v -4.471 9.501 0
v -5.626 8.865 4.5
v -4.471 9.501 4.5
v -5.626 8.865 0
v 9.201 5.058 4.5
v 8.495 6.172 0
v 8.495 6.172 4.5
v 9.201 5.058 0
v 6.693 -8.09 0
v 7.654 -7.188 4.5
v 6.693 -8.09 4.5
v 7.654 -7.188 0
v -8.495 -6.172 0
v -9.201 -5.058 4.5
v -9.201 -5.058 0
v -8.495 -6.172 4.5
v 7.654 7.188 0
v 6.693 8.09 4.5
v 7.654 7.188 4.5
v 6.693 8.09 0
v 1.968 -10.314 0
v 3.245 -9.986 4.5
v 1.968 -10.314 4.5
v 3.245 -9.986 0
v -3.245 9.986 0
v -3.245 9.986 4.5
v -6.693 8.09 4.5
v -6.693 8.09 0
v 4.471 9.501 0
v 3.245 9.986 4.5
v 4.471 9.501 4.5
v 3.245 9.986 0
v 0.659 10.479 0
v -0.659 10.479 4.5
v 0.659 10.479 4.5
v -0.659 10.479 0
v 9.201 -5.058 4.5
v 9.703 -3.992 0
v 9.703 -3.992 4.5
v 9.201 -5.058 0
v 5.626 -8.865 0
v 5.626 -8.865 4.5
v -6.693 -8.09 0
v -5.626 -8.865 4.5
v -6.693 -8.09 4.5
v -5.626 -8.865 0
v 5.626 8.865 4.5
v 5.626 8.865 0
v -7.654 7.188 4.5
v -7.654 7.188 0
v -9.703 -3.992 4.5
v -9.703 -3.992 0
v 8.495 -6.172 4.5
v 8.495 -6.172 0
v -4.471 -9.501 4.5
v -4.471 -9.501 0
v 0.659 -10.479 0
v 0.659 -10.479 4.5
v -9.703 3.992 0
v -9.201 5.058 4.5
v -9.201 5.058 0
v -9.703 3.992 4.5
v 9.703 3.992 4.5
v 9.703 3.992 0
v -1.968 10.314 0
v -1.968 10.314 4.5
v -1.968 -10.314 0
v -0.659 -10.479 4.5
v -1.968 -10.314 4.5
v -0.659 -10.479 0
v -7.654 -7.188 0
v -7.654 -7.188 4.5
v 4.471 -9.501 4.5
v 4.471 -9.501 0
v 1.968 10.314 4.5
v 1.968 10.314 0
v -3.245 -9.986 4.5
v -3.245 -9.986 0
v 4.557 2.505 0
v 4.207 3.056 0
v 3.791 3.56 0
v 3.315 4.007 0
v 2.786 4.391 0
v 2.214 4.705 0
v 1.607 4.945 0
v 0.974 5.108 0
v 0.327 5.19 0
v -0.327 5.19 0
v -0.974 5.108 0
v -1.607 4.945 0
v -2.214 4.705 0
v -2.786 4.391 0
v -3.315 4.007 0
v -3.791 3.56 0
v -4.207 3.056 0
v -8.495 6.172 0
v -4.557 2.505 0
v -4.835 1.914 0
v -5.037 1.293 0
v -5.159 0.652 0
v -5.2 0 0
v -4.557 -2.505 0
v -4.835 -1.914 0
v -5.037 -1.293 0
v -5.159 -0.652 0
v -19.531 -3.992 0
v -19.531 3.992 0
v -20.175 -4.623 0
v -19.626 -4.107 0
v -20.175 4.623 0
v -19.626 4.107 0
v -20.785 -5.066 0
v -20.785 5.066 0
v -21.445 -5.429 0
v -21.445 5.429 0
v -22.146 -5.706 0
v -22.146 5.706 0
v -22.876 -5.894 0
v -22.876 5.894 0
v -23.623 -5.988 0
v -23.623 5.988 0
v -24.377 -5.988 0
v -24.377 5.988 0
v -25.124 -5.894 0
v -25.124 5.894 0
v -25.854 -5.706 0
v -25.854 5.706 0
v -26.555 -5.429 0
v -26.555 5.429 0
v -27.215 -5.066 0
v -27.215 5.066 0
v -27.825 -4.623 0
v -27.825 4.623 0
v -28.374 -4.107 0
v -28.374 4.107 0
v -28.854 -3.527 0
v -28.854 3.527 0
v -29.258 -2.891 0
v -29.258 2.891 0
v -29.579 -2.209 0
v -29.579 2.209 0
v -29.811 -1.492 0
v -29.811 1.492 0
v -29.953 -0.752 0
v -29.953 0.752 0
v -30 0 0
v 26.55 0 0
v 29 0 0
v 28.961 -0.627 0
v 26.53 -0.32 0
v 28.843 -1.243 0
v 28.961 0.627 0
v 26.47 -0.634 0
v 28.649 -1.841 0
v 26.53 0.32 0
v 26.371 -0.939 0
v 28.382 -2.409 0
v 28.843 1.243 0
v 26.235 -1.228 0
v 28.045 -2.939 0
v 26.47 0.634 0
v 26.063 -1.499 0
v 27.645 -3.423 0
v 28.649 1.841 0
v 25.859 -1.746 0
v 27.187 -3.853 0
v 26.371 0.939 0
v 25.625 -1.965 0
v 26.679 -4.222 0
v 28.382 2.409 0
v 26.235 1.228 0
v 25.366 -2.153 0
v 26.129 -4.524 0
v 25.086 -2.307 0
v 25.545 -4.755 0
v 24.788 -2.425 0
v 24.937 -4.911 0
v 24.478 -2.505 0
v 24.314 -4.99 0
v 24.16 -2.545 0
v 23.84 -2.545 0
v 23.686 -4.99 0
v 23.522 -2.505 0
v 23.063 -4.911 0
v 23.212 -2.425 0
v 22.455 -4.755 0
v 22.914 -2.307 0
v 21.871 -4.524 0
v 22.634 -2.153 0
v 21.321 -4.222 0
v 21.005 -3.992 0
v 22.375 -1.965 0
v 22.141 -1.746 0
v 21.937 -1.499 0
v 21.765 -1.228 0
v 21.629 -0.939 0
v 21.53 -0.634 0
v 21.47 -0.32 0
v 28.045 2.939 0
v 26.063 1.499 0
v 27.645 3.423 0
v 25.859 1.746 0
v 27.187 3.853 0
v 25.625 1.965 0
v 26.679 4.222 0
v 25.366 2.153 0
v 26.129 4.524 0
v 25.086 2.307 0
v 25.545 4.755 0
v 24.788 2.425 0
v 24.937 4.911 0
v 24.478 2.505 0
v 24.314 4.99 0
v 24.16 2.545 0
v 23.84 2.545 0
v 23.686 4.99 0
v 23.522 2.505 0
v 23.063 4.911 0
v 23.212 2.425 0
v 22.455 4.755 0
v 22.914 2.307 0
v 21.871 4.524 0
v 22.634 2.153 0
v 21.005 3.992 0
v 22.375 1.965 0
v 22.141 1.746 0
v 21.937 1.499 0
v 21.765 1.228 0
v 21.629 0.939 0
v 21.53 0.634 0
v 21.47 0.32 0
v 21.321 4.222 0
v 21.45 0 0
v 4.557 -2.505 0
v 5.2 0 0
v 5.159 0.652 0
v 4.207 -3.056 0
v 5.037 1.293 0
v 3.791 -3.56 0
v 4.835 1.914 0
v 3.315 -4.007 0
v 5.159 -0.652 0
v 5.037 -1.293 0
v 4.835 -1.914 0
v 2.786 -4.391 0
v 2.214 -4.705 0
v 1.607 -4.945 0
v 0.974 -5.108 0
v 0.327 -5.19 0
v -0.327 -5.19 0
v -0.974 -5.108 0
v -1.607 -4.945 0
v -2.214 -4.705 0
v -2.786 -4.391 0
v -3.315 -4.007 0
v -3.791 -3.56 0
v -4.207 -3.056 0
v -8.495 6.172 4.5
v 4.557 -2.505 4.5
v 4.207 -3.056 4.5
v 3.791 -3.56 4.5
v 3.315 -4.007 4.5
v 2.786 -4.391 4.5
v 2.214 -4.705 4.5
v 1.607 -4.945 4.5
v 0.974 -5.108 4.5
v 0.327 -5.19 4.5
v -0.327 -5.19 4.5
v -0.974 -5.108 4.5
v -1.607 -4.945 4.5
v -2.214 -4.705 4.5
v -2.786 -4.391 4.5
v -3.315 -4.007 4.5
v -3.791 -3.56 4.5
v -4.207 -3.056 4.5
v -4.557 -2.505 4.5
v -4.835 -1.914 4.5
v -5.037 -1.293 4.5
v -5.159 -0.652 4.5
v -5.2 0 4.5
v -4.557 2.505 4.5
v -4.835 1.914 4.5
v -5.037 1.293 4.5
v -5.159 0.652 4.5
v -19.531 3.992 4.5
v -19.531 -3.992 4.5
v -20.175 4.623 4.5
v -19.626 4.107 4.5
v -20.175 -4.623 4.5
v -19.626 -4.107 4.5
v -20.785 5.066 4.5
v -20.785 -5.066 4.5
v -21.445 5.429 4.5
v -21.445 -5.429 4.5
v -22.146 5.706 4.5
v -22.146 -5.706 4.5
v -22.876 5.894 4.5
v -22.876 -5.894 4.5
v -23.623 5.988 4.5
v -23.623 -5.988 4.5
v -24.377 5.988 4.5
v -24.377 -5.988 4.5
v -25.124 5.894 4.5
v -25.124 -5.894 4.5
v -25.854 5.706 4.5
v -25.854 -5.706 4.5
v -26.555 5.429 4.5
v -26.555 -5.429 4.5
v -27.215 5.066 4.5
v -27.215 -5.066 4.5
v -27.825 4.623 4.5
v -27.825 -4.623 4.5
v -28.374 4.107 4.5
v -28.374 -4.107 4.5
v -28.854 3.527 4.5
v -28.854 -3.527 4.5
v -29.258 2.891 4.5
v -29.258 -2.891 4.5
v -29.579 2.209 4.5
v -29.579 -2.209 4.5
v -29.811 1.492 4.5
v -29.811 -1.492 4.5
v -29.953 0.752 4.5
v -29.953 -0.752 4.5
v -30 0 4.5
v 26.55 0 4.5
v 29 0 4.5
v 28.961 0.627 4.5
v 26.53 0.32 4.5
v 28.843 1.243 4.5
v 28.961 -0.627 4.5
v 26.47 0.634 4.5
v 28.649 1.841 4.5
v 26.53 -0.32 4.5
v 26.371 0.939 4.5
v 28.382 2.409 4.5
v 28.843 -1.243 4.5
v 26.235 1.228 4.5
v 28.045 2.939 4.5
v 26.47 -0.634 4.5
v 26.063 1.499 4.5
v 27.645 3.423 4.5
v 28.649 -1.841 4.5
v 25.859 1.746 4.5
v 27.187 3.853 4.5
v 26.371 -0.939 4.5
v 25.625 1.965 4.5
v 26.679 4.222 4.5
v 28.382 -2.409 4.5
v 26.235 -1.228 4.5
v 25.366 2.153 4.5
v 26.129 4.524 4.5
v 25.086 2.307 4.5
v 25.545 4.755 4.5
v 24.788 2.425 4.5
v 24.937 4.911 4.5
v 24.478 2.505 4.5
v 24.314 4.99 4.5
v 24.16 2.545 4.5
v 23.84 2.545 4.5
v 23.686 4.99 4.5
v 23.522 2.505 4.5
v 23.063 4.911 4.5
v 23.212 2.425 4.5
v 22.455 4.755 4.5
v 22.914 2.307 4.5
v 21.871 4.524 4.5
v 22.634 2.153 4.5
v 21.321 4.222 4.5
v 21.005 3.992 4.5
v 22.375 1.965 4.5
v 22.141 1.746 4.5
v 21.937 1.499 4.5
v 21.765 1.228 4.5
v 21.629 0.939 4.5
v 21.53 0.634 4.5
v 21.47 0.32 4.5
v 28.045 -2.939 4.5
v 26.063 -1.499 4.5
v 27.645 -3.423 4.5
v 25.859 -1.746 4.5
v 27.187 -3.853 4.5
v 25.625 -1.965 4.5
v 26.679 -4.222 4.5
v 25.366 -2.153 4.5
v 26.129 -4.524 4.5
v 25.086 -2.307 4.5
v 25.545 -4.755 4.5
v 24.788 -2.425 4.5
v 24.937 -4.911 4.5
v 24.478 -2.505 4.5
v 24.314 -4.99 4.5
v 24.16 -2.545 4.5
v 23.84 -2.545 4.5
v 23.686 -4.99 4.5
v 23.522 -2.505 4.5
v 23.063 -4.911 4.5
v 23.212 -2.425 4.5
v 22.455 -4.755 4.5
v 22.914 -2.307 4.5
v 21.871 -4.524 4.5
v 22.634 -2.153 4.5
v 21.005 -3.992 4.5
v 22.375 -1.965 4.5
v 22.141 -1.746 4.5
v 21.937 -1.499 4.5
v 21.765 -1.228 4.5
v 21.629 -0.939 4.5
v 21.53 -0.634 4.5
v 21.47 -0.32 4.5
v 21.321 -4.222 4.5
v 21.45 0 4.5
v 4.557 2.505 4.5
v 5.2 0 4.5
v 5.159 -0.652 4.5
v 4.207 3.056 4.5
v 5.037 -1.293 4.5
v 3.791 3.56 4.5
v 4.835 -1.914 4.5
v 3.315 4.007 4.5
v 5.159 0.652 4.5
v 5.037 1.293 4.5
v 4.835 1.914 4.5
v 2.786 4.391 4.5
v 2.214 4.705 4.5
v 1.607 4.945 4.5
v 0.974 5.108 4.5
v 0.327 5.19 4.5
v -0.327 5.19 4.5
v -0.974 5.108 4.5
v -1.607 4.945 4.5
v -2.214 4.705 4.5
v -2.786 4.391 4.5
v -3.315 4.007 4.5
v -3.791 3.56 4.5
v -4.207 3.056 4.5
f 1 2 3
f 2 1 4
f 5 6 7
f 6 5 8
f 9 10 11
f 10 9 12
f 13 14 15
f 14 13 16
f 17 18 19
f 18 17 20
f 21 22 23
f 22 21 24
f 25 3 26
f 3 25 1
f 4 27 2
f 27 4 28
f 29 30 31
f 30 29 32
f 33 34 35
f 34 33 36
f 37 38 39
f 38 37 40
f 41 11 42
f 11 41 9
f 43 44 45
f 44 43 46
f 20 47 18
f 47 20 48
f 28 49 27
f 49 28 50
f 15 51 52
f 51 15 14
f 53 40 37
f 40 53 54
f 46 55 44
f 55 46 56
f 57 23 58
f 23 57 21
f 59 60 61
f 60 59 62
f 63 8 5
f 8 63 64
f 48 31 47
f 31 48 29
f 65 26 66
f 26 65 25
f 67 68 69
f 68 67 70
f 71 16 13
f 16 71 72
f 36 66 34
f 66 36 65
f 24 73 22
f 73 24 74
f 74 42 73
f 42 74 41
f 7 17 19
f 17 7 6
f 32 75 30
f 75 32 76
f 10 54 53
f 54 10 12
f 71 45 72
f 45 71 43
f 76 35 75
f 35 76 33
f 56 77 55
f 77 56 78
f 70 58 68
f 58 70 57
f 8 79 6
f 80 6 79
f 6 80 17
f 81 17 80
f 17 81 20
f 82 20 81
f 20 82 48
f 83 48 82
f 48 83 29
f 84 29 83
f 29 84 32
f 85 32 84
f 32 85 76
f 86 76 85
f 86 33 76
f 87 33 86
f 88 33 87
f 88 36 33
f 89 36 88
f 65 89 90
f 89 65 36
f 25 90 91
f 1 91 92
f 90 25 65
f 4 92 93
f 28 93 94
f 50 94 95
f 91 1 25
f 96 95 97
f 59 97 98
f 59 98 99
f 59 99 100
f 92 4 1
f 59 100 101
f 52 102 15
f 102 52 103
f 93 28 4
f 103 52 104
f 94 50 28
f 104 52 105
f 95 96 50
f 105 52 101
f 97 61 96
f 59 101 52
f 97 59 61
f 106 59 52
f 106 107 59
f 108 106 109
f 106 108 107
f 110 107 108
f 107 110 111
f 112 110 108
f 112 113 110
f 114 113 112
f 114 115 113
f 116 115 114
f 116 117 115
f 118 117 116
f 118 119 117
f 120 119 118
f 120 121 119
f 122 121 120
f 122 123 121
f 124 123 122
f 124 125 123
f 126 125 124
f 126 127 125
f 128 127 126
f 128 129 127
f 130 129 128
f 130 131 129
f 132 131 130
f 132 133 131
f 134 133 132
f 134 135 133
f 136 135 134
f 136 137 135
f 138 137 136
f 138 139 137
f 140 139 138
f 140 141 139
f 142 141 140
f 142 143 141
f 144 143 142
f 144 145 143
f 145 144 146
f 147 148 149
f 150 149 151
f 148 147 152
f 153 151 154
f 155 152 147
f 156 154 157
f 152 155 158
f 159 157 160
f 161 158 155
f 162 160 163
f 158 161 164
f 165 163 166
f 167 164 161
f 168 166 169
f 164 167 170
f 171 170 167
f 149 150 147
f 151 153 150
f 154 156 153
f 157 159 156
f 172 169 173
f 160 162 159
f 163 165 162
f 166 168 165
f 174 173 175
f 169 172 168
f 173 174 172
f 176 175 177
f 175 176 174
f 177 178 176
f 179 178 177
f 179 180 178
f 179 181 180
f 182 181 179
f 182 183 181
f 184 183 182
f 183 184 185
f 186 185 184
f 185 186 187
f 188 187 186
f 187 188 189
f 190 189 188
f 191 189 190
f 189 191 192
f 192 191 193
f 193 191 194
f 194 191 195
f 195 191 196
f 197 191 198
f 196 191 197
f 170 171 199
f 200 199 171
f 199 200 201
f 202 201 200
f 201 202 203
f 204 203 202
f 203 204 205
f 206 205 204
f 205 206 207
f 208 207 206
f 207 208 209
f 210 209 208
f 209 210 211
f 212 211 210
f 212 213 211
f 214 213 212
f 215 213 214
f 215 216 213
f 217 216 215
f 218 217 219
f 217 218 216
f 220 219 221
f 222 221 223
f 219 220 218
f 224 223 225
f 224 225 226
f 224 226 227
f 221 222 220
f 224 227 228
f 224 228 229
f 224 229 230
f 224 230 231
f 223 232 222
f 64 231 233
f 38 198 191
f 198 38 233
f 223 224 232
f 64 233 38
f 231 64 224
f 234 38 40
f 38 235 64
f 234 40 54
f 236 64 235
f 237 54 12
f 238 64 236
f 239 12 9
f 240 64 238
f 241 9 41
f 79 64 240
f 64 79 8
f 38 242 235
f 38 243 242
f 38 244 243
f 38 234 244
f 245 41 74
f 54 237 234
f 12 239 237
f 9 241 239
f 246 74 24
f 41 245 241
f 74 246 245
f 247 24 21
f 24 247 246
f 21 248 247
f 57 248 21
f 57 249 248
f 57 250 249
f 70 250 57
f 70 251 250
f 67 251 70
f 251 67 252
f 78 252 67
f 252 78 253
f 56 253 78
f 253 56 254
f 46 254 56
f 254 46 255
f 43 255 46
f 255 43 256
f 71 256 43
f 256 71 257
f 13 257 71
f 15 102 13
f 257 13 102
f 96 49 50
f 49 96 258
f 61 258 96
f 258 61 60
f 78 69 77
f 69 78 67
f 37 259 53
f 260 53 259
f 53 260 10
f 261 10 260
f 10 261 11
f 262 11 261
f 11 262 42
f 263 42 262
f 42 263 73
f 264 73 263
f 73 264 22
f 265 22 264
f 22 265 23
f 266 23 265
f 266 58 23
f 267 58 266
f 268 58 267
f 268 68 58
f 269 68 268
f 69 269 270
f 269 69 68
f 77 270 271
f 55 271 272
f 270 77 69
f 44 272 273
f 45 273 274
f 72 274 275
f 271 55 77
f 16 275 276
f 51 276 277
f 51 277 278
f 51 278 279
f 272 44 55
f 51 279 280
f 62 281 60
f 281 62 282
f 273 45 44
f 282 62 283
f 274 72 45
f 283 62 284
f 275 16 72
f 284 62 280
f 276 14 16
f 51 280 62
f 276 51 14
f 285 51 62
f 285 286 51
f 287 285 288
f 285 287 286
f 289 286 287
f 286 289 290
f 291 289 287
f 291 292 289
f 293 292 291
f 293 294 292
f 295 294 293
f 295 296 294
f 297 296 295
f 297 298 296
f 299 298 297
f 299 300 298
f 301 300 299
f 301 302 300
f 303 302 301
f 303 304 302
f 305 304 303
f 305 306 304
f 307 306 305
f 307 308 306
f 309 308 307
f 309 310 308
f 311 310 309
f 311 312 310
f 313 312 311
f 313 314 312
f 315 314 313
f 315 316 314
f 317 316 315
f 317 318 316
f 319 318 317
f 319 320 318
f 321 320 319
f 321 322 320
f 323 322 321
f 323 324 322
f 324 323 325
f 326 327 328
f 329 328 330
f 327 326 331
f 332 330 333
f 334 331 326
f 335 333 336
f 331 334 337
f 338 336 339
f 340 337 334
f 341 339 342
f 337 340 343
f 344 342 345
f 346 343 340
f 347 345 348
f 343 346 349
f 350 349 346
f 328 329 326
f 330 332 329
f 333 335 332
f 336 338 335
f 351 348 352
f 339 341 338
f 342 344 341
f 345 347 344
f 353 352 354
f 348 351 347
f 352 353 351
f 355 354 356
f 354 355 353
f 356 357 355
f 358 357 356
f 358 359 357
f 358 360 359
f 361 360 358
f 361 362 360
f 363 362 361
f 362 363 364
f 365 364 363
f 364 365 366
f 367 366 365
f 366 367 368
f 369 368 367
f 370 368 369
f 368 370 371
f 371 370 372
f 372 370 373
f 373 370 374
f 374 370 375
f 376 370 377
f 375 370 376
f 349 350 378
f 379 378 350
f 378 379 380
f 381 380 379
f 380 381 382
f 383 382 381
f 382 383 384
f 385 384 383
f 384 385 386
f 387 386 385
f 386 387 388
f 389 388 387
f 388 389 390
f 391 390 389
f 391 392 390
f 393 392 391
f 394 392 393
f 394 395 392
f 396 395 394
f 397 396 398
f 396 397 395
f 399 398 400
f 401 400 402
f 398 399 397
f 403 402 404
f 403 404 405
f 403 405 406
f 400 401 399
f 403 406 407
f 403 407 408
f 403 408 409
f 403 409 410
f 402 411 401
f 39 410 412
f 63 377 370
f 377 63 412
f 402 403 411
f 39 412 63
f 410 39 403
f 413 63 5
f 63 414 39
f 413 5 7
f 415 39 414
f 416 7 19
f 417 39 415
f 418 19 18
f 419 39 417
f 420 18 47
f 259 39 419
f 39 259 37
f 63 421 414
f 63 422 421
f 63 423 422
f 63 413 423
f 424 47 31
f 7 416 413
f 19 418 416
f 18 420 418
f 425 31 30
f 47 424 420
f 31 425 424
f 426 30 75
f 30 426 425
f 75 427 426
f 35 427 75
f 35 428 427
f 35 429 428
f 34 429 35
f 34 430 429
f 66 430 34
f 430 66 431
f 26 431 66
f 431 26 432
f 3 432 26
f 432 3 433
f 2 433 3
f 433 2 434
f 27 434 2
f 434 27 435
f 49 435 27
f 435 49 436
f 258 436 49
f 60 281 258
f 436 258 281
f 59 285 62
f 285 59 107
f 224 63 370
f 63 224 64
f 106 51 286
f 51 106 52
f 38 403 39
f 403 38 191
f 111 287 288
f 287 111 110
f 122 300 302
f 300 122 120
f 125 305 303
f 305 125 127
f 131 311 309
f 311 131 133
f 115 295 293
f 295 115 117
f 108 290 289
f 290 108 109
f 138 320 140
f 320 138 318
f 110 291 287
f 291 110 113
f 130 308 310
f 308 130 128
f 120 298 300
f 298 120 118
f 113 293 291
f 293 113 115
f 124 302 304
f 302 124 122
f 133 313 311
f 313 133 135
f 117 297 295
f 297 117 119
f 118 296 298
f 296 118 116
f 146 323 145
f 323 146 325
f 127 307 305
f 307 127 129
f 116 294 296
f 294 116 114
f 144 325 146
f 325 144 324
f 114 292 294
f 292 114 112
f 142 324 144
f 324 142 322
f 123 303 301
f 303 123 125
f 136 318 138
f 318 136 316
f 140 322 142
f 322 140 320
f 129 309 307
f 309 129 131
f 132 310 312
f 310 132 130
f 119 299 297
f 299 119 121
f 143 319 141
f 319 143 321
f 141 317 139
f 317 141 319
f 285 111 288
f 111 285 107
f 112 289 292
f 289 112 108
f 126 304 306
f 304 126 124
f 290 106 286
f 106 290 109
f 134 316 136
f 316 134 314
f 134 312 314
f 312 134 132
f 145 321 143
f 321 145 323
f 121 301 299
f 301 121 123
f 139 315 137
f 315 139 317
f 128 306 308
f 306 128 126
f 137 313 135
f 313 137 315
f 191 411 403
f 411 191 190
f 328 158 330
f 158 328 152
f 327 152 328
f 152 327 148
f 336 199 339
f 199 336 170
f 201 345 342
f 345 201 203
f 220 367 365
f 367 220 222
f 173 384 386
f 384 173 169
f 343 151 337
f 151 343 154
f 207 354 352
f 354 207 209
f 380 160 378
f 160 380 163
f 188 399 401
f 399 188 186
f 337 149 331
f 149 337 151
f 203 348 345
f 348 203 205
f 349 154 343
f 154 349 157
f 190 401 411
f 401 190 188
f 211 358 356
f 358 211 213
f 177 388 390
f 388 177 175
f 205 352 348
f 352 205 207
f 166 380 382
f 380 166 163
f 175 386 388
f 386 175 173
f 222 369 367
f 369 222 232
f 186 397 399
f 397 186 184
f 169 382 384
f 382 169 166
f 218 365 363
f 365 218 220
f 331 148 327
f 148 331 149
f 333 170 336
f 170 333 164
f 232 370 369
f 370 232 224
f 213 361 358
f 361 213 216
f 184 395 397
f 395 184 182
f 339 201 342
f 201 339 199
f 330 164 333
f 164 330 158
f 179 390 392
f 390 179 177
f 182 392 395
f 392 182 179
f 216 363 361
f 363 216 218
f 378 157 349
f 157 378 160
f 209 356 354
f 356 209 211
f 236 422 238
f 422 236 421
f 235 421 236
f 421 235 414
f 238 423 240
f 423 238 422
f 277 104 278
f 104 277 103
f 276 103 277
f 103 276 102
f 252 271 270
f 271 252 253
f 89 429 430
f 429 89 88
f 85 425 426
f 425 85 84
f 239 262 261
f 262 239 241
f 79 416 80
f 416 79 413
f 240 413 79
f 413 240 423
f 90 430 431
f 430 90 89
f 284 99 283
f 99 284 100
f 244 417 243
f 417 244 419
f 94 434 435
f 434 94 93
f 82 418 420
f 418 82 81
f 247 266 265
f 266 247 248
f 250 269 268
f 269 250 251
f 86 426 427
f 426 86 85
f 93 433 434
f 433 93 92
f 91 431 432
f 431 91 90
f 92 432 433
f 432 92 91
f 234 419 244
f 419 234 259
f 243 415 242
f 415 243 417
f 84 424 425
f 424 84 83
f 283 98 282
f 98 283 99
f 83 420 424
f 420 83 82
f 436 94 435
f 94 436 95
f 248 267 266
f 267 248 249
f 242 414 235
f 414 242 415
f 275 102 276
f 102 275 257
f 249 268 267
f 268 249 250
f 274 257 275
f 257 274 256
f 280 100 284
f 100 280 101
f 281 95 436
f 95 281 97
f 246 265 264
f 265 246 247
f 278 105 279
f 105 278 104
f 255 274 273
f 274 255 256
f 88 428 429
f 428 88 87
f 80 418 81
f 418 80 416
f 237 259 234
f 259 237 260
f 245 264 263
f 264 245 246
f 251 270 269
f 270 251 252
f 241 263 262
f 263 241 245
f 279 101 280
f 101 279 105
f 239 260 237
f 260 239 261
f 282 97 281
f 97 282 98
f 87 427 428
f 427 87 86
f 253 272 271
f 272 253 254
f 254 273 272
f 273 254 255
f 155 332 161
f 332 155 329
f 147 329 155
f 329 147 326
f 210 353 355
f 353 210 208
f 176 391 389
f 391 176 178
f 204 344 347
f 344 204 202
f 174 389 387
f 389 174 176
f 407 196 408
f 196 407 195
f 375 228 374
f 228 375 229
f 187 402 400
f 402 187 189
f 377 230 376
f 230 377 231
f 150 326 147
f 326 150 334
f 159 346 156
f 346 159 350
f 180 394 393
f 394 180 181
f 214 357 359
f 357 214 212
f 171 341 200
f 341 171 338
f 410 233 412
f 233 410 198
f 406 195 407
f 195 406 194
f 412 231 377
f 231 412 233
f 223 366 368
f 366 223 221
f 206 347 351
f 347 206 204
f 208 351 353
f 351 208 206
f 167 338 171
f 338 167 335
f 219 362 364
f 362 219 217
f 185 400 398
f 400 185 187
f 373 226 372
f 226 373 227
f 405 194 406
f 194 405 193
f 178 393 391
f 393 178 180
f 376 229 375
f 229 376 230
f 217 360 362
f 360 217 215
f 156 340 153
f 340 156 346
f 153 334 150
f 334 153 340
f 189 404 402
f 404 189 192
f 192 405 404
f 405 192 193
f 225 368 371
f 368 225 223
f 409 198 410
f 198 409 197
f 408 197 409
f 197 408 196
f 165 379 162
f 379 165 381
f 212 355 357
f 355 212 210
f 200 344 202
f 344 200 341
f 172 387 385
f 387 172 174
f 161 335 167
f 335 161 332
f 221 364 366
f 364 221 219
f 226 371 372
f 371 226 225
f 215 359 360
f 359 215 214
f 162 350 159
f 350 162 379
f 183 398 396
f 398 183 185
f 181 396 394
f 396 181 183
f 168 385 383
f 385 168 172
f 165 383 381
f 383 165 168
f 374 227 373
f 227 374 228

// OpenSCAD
difference() {
  difference() {
    union() {
      union() {
        union() {
          cylinder(h = 4.5, r = 10.5);
          hull() {
            translate([-24, 0, 0]) {
              cylinder(h = 4.5, r = 4);
            }
            translate([24, 0, 0]) {
              cylinder(h = 4.5, r = 4);
            }
          }
        }
        translate([-24, 0, 0]) {
          cylinder(h = 4.5, r = 6);
        }
      }
      translate([24, 0, 0]) {
        cylinder(h = 4.5, r = 5);
      }
    }
    translate([0, 0, -0.2]) {
      cylinder(h = 4.9, r = 5.2);
    }
  }
  translate([24, 0, 0]) {
    translate([0, 0, -0.2]) {
      cylinder(h = 4.9, r = 2.55);
    }
  }
}
$fn = 50;
